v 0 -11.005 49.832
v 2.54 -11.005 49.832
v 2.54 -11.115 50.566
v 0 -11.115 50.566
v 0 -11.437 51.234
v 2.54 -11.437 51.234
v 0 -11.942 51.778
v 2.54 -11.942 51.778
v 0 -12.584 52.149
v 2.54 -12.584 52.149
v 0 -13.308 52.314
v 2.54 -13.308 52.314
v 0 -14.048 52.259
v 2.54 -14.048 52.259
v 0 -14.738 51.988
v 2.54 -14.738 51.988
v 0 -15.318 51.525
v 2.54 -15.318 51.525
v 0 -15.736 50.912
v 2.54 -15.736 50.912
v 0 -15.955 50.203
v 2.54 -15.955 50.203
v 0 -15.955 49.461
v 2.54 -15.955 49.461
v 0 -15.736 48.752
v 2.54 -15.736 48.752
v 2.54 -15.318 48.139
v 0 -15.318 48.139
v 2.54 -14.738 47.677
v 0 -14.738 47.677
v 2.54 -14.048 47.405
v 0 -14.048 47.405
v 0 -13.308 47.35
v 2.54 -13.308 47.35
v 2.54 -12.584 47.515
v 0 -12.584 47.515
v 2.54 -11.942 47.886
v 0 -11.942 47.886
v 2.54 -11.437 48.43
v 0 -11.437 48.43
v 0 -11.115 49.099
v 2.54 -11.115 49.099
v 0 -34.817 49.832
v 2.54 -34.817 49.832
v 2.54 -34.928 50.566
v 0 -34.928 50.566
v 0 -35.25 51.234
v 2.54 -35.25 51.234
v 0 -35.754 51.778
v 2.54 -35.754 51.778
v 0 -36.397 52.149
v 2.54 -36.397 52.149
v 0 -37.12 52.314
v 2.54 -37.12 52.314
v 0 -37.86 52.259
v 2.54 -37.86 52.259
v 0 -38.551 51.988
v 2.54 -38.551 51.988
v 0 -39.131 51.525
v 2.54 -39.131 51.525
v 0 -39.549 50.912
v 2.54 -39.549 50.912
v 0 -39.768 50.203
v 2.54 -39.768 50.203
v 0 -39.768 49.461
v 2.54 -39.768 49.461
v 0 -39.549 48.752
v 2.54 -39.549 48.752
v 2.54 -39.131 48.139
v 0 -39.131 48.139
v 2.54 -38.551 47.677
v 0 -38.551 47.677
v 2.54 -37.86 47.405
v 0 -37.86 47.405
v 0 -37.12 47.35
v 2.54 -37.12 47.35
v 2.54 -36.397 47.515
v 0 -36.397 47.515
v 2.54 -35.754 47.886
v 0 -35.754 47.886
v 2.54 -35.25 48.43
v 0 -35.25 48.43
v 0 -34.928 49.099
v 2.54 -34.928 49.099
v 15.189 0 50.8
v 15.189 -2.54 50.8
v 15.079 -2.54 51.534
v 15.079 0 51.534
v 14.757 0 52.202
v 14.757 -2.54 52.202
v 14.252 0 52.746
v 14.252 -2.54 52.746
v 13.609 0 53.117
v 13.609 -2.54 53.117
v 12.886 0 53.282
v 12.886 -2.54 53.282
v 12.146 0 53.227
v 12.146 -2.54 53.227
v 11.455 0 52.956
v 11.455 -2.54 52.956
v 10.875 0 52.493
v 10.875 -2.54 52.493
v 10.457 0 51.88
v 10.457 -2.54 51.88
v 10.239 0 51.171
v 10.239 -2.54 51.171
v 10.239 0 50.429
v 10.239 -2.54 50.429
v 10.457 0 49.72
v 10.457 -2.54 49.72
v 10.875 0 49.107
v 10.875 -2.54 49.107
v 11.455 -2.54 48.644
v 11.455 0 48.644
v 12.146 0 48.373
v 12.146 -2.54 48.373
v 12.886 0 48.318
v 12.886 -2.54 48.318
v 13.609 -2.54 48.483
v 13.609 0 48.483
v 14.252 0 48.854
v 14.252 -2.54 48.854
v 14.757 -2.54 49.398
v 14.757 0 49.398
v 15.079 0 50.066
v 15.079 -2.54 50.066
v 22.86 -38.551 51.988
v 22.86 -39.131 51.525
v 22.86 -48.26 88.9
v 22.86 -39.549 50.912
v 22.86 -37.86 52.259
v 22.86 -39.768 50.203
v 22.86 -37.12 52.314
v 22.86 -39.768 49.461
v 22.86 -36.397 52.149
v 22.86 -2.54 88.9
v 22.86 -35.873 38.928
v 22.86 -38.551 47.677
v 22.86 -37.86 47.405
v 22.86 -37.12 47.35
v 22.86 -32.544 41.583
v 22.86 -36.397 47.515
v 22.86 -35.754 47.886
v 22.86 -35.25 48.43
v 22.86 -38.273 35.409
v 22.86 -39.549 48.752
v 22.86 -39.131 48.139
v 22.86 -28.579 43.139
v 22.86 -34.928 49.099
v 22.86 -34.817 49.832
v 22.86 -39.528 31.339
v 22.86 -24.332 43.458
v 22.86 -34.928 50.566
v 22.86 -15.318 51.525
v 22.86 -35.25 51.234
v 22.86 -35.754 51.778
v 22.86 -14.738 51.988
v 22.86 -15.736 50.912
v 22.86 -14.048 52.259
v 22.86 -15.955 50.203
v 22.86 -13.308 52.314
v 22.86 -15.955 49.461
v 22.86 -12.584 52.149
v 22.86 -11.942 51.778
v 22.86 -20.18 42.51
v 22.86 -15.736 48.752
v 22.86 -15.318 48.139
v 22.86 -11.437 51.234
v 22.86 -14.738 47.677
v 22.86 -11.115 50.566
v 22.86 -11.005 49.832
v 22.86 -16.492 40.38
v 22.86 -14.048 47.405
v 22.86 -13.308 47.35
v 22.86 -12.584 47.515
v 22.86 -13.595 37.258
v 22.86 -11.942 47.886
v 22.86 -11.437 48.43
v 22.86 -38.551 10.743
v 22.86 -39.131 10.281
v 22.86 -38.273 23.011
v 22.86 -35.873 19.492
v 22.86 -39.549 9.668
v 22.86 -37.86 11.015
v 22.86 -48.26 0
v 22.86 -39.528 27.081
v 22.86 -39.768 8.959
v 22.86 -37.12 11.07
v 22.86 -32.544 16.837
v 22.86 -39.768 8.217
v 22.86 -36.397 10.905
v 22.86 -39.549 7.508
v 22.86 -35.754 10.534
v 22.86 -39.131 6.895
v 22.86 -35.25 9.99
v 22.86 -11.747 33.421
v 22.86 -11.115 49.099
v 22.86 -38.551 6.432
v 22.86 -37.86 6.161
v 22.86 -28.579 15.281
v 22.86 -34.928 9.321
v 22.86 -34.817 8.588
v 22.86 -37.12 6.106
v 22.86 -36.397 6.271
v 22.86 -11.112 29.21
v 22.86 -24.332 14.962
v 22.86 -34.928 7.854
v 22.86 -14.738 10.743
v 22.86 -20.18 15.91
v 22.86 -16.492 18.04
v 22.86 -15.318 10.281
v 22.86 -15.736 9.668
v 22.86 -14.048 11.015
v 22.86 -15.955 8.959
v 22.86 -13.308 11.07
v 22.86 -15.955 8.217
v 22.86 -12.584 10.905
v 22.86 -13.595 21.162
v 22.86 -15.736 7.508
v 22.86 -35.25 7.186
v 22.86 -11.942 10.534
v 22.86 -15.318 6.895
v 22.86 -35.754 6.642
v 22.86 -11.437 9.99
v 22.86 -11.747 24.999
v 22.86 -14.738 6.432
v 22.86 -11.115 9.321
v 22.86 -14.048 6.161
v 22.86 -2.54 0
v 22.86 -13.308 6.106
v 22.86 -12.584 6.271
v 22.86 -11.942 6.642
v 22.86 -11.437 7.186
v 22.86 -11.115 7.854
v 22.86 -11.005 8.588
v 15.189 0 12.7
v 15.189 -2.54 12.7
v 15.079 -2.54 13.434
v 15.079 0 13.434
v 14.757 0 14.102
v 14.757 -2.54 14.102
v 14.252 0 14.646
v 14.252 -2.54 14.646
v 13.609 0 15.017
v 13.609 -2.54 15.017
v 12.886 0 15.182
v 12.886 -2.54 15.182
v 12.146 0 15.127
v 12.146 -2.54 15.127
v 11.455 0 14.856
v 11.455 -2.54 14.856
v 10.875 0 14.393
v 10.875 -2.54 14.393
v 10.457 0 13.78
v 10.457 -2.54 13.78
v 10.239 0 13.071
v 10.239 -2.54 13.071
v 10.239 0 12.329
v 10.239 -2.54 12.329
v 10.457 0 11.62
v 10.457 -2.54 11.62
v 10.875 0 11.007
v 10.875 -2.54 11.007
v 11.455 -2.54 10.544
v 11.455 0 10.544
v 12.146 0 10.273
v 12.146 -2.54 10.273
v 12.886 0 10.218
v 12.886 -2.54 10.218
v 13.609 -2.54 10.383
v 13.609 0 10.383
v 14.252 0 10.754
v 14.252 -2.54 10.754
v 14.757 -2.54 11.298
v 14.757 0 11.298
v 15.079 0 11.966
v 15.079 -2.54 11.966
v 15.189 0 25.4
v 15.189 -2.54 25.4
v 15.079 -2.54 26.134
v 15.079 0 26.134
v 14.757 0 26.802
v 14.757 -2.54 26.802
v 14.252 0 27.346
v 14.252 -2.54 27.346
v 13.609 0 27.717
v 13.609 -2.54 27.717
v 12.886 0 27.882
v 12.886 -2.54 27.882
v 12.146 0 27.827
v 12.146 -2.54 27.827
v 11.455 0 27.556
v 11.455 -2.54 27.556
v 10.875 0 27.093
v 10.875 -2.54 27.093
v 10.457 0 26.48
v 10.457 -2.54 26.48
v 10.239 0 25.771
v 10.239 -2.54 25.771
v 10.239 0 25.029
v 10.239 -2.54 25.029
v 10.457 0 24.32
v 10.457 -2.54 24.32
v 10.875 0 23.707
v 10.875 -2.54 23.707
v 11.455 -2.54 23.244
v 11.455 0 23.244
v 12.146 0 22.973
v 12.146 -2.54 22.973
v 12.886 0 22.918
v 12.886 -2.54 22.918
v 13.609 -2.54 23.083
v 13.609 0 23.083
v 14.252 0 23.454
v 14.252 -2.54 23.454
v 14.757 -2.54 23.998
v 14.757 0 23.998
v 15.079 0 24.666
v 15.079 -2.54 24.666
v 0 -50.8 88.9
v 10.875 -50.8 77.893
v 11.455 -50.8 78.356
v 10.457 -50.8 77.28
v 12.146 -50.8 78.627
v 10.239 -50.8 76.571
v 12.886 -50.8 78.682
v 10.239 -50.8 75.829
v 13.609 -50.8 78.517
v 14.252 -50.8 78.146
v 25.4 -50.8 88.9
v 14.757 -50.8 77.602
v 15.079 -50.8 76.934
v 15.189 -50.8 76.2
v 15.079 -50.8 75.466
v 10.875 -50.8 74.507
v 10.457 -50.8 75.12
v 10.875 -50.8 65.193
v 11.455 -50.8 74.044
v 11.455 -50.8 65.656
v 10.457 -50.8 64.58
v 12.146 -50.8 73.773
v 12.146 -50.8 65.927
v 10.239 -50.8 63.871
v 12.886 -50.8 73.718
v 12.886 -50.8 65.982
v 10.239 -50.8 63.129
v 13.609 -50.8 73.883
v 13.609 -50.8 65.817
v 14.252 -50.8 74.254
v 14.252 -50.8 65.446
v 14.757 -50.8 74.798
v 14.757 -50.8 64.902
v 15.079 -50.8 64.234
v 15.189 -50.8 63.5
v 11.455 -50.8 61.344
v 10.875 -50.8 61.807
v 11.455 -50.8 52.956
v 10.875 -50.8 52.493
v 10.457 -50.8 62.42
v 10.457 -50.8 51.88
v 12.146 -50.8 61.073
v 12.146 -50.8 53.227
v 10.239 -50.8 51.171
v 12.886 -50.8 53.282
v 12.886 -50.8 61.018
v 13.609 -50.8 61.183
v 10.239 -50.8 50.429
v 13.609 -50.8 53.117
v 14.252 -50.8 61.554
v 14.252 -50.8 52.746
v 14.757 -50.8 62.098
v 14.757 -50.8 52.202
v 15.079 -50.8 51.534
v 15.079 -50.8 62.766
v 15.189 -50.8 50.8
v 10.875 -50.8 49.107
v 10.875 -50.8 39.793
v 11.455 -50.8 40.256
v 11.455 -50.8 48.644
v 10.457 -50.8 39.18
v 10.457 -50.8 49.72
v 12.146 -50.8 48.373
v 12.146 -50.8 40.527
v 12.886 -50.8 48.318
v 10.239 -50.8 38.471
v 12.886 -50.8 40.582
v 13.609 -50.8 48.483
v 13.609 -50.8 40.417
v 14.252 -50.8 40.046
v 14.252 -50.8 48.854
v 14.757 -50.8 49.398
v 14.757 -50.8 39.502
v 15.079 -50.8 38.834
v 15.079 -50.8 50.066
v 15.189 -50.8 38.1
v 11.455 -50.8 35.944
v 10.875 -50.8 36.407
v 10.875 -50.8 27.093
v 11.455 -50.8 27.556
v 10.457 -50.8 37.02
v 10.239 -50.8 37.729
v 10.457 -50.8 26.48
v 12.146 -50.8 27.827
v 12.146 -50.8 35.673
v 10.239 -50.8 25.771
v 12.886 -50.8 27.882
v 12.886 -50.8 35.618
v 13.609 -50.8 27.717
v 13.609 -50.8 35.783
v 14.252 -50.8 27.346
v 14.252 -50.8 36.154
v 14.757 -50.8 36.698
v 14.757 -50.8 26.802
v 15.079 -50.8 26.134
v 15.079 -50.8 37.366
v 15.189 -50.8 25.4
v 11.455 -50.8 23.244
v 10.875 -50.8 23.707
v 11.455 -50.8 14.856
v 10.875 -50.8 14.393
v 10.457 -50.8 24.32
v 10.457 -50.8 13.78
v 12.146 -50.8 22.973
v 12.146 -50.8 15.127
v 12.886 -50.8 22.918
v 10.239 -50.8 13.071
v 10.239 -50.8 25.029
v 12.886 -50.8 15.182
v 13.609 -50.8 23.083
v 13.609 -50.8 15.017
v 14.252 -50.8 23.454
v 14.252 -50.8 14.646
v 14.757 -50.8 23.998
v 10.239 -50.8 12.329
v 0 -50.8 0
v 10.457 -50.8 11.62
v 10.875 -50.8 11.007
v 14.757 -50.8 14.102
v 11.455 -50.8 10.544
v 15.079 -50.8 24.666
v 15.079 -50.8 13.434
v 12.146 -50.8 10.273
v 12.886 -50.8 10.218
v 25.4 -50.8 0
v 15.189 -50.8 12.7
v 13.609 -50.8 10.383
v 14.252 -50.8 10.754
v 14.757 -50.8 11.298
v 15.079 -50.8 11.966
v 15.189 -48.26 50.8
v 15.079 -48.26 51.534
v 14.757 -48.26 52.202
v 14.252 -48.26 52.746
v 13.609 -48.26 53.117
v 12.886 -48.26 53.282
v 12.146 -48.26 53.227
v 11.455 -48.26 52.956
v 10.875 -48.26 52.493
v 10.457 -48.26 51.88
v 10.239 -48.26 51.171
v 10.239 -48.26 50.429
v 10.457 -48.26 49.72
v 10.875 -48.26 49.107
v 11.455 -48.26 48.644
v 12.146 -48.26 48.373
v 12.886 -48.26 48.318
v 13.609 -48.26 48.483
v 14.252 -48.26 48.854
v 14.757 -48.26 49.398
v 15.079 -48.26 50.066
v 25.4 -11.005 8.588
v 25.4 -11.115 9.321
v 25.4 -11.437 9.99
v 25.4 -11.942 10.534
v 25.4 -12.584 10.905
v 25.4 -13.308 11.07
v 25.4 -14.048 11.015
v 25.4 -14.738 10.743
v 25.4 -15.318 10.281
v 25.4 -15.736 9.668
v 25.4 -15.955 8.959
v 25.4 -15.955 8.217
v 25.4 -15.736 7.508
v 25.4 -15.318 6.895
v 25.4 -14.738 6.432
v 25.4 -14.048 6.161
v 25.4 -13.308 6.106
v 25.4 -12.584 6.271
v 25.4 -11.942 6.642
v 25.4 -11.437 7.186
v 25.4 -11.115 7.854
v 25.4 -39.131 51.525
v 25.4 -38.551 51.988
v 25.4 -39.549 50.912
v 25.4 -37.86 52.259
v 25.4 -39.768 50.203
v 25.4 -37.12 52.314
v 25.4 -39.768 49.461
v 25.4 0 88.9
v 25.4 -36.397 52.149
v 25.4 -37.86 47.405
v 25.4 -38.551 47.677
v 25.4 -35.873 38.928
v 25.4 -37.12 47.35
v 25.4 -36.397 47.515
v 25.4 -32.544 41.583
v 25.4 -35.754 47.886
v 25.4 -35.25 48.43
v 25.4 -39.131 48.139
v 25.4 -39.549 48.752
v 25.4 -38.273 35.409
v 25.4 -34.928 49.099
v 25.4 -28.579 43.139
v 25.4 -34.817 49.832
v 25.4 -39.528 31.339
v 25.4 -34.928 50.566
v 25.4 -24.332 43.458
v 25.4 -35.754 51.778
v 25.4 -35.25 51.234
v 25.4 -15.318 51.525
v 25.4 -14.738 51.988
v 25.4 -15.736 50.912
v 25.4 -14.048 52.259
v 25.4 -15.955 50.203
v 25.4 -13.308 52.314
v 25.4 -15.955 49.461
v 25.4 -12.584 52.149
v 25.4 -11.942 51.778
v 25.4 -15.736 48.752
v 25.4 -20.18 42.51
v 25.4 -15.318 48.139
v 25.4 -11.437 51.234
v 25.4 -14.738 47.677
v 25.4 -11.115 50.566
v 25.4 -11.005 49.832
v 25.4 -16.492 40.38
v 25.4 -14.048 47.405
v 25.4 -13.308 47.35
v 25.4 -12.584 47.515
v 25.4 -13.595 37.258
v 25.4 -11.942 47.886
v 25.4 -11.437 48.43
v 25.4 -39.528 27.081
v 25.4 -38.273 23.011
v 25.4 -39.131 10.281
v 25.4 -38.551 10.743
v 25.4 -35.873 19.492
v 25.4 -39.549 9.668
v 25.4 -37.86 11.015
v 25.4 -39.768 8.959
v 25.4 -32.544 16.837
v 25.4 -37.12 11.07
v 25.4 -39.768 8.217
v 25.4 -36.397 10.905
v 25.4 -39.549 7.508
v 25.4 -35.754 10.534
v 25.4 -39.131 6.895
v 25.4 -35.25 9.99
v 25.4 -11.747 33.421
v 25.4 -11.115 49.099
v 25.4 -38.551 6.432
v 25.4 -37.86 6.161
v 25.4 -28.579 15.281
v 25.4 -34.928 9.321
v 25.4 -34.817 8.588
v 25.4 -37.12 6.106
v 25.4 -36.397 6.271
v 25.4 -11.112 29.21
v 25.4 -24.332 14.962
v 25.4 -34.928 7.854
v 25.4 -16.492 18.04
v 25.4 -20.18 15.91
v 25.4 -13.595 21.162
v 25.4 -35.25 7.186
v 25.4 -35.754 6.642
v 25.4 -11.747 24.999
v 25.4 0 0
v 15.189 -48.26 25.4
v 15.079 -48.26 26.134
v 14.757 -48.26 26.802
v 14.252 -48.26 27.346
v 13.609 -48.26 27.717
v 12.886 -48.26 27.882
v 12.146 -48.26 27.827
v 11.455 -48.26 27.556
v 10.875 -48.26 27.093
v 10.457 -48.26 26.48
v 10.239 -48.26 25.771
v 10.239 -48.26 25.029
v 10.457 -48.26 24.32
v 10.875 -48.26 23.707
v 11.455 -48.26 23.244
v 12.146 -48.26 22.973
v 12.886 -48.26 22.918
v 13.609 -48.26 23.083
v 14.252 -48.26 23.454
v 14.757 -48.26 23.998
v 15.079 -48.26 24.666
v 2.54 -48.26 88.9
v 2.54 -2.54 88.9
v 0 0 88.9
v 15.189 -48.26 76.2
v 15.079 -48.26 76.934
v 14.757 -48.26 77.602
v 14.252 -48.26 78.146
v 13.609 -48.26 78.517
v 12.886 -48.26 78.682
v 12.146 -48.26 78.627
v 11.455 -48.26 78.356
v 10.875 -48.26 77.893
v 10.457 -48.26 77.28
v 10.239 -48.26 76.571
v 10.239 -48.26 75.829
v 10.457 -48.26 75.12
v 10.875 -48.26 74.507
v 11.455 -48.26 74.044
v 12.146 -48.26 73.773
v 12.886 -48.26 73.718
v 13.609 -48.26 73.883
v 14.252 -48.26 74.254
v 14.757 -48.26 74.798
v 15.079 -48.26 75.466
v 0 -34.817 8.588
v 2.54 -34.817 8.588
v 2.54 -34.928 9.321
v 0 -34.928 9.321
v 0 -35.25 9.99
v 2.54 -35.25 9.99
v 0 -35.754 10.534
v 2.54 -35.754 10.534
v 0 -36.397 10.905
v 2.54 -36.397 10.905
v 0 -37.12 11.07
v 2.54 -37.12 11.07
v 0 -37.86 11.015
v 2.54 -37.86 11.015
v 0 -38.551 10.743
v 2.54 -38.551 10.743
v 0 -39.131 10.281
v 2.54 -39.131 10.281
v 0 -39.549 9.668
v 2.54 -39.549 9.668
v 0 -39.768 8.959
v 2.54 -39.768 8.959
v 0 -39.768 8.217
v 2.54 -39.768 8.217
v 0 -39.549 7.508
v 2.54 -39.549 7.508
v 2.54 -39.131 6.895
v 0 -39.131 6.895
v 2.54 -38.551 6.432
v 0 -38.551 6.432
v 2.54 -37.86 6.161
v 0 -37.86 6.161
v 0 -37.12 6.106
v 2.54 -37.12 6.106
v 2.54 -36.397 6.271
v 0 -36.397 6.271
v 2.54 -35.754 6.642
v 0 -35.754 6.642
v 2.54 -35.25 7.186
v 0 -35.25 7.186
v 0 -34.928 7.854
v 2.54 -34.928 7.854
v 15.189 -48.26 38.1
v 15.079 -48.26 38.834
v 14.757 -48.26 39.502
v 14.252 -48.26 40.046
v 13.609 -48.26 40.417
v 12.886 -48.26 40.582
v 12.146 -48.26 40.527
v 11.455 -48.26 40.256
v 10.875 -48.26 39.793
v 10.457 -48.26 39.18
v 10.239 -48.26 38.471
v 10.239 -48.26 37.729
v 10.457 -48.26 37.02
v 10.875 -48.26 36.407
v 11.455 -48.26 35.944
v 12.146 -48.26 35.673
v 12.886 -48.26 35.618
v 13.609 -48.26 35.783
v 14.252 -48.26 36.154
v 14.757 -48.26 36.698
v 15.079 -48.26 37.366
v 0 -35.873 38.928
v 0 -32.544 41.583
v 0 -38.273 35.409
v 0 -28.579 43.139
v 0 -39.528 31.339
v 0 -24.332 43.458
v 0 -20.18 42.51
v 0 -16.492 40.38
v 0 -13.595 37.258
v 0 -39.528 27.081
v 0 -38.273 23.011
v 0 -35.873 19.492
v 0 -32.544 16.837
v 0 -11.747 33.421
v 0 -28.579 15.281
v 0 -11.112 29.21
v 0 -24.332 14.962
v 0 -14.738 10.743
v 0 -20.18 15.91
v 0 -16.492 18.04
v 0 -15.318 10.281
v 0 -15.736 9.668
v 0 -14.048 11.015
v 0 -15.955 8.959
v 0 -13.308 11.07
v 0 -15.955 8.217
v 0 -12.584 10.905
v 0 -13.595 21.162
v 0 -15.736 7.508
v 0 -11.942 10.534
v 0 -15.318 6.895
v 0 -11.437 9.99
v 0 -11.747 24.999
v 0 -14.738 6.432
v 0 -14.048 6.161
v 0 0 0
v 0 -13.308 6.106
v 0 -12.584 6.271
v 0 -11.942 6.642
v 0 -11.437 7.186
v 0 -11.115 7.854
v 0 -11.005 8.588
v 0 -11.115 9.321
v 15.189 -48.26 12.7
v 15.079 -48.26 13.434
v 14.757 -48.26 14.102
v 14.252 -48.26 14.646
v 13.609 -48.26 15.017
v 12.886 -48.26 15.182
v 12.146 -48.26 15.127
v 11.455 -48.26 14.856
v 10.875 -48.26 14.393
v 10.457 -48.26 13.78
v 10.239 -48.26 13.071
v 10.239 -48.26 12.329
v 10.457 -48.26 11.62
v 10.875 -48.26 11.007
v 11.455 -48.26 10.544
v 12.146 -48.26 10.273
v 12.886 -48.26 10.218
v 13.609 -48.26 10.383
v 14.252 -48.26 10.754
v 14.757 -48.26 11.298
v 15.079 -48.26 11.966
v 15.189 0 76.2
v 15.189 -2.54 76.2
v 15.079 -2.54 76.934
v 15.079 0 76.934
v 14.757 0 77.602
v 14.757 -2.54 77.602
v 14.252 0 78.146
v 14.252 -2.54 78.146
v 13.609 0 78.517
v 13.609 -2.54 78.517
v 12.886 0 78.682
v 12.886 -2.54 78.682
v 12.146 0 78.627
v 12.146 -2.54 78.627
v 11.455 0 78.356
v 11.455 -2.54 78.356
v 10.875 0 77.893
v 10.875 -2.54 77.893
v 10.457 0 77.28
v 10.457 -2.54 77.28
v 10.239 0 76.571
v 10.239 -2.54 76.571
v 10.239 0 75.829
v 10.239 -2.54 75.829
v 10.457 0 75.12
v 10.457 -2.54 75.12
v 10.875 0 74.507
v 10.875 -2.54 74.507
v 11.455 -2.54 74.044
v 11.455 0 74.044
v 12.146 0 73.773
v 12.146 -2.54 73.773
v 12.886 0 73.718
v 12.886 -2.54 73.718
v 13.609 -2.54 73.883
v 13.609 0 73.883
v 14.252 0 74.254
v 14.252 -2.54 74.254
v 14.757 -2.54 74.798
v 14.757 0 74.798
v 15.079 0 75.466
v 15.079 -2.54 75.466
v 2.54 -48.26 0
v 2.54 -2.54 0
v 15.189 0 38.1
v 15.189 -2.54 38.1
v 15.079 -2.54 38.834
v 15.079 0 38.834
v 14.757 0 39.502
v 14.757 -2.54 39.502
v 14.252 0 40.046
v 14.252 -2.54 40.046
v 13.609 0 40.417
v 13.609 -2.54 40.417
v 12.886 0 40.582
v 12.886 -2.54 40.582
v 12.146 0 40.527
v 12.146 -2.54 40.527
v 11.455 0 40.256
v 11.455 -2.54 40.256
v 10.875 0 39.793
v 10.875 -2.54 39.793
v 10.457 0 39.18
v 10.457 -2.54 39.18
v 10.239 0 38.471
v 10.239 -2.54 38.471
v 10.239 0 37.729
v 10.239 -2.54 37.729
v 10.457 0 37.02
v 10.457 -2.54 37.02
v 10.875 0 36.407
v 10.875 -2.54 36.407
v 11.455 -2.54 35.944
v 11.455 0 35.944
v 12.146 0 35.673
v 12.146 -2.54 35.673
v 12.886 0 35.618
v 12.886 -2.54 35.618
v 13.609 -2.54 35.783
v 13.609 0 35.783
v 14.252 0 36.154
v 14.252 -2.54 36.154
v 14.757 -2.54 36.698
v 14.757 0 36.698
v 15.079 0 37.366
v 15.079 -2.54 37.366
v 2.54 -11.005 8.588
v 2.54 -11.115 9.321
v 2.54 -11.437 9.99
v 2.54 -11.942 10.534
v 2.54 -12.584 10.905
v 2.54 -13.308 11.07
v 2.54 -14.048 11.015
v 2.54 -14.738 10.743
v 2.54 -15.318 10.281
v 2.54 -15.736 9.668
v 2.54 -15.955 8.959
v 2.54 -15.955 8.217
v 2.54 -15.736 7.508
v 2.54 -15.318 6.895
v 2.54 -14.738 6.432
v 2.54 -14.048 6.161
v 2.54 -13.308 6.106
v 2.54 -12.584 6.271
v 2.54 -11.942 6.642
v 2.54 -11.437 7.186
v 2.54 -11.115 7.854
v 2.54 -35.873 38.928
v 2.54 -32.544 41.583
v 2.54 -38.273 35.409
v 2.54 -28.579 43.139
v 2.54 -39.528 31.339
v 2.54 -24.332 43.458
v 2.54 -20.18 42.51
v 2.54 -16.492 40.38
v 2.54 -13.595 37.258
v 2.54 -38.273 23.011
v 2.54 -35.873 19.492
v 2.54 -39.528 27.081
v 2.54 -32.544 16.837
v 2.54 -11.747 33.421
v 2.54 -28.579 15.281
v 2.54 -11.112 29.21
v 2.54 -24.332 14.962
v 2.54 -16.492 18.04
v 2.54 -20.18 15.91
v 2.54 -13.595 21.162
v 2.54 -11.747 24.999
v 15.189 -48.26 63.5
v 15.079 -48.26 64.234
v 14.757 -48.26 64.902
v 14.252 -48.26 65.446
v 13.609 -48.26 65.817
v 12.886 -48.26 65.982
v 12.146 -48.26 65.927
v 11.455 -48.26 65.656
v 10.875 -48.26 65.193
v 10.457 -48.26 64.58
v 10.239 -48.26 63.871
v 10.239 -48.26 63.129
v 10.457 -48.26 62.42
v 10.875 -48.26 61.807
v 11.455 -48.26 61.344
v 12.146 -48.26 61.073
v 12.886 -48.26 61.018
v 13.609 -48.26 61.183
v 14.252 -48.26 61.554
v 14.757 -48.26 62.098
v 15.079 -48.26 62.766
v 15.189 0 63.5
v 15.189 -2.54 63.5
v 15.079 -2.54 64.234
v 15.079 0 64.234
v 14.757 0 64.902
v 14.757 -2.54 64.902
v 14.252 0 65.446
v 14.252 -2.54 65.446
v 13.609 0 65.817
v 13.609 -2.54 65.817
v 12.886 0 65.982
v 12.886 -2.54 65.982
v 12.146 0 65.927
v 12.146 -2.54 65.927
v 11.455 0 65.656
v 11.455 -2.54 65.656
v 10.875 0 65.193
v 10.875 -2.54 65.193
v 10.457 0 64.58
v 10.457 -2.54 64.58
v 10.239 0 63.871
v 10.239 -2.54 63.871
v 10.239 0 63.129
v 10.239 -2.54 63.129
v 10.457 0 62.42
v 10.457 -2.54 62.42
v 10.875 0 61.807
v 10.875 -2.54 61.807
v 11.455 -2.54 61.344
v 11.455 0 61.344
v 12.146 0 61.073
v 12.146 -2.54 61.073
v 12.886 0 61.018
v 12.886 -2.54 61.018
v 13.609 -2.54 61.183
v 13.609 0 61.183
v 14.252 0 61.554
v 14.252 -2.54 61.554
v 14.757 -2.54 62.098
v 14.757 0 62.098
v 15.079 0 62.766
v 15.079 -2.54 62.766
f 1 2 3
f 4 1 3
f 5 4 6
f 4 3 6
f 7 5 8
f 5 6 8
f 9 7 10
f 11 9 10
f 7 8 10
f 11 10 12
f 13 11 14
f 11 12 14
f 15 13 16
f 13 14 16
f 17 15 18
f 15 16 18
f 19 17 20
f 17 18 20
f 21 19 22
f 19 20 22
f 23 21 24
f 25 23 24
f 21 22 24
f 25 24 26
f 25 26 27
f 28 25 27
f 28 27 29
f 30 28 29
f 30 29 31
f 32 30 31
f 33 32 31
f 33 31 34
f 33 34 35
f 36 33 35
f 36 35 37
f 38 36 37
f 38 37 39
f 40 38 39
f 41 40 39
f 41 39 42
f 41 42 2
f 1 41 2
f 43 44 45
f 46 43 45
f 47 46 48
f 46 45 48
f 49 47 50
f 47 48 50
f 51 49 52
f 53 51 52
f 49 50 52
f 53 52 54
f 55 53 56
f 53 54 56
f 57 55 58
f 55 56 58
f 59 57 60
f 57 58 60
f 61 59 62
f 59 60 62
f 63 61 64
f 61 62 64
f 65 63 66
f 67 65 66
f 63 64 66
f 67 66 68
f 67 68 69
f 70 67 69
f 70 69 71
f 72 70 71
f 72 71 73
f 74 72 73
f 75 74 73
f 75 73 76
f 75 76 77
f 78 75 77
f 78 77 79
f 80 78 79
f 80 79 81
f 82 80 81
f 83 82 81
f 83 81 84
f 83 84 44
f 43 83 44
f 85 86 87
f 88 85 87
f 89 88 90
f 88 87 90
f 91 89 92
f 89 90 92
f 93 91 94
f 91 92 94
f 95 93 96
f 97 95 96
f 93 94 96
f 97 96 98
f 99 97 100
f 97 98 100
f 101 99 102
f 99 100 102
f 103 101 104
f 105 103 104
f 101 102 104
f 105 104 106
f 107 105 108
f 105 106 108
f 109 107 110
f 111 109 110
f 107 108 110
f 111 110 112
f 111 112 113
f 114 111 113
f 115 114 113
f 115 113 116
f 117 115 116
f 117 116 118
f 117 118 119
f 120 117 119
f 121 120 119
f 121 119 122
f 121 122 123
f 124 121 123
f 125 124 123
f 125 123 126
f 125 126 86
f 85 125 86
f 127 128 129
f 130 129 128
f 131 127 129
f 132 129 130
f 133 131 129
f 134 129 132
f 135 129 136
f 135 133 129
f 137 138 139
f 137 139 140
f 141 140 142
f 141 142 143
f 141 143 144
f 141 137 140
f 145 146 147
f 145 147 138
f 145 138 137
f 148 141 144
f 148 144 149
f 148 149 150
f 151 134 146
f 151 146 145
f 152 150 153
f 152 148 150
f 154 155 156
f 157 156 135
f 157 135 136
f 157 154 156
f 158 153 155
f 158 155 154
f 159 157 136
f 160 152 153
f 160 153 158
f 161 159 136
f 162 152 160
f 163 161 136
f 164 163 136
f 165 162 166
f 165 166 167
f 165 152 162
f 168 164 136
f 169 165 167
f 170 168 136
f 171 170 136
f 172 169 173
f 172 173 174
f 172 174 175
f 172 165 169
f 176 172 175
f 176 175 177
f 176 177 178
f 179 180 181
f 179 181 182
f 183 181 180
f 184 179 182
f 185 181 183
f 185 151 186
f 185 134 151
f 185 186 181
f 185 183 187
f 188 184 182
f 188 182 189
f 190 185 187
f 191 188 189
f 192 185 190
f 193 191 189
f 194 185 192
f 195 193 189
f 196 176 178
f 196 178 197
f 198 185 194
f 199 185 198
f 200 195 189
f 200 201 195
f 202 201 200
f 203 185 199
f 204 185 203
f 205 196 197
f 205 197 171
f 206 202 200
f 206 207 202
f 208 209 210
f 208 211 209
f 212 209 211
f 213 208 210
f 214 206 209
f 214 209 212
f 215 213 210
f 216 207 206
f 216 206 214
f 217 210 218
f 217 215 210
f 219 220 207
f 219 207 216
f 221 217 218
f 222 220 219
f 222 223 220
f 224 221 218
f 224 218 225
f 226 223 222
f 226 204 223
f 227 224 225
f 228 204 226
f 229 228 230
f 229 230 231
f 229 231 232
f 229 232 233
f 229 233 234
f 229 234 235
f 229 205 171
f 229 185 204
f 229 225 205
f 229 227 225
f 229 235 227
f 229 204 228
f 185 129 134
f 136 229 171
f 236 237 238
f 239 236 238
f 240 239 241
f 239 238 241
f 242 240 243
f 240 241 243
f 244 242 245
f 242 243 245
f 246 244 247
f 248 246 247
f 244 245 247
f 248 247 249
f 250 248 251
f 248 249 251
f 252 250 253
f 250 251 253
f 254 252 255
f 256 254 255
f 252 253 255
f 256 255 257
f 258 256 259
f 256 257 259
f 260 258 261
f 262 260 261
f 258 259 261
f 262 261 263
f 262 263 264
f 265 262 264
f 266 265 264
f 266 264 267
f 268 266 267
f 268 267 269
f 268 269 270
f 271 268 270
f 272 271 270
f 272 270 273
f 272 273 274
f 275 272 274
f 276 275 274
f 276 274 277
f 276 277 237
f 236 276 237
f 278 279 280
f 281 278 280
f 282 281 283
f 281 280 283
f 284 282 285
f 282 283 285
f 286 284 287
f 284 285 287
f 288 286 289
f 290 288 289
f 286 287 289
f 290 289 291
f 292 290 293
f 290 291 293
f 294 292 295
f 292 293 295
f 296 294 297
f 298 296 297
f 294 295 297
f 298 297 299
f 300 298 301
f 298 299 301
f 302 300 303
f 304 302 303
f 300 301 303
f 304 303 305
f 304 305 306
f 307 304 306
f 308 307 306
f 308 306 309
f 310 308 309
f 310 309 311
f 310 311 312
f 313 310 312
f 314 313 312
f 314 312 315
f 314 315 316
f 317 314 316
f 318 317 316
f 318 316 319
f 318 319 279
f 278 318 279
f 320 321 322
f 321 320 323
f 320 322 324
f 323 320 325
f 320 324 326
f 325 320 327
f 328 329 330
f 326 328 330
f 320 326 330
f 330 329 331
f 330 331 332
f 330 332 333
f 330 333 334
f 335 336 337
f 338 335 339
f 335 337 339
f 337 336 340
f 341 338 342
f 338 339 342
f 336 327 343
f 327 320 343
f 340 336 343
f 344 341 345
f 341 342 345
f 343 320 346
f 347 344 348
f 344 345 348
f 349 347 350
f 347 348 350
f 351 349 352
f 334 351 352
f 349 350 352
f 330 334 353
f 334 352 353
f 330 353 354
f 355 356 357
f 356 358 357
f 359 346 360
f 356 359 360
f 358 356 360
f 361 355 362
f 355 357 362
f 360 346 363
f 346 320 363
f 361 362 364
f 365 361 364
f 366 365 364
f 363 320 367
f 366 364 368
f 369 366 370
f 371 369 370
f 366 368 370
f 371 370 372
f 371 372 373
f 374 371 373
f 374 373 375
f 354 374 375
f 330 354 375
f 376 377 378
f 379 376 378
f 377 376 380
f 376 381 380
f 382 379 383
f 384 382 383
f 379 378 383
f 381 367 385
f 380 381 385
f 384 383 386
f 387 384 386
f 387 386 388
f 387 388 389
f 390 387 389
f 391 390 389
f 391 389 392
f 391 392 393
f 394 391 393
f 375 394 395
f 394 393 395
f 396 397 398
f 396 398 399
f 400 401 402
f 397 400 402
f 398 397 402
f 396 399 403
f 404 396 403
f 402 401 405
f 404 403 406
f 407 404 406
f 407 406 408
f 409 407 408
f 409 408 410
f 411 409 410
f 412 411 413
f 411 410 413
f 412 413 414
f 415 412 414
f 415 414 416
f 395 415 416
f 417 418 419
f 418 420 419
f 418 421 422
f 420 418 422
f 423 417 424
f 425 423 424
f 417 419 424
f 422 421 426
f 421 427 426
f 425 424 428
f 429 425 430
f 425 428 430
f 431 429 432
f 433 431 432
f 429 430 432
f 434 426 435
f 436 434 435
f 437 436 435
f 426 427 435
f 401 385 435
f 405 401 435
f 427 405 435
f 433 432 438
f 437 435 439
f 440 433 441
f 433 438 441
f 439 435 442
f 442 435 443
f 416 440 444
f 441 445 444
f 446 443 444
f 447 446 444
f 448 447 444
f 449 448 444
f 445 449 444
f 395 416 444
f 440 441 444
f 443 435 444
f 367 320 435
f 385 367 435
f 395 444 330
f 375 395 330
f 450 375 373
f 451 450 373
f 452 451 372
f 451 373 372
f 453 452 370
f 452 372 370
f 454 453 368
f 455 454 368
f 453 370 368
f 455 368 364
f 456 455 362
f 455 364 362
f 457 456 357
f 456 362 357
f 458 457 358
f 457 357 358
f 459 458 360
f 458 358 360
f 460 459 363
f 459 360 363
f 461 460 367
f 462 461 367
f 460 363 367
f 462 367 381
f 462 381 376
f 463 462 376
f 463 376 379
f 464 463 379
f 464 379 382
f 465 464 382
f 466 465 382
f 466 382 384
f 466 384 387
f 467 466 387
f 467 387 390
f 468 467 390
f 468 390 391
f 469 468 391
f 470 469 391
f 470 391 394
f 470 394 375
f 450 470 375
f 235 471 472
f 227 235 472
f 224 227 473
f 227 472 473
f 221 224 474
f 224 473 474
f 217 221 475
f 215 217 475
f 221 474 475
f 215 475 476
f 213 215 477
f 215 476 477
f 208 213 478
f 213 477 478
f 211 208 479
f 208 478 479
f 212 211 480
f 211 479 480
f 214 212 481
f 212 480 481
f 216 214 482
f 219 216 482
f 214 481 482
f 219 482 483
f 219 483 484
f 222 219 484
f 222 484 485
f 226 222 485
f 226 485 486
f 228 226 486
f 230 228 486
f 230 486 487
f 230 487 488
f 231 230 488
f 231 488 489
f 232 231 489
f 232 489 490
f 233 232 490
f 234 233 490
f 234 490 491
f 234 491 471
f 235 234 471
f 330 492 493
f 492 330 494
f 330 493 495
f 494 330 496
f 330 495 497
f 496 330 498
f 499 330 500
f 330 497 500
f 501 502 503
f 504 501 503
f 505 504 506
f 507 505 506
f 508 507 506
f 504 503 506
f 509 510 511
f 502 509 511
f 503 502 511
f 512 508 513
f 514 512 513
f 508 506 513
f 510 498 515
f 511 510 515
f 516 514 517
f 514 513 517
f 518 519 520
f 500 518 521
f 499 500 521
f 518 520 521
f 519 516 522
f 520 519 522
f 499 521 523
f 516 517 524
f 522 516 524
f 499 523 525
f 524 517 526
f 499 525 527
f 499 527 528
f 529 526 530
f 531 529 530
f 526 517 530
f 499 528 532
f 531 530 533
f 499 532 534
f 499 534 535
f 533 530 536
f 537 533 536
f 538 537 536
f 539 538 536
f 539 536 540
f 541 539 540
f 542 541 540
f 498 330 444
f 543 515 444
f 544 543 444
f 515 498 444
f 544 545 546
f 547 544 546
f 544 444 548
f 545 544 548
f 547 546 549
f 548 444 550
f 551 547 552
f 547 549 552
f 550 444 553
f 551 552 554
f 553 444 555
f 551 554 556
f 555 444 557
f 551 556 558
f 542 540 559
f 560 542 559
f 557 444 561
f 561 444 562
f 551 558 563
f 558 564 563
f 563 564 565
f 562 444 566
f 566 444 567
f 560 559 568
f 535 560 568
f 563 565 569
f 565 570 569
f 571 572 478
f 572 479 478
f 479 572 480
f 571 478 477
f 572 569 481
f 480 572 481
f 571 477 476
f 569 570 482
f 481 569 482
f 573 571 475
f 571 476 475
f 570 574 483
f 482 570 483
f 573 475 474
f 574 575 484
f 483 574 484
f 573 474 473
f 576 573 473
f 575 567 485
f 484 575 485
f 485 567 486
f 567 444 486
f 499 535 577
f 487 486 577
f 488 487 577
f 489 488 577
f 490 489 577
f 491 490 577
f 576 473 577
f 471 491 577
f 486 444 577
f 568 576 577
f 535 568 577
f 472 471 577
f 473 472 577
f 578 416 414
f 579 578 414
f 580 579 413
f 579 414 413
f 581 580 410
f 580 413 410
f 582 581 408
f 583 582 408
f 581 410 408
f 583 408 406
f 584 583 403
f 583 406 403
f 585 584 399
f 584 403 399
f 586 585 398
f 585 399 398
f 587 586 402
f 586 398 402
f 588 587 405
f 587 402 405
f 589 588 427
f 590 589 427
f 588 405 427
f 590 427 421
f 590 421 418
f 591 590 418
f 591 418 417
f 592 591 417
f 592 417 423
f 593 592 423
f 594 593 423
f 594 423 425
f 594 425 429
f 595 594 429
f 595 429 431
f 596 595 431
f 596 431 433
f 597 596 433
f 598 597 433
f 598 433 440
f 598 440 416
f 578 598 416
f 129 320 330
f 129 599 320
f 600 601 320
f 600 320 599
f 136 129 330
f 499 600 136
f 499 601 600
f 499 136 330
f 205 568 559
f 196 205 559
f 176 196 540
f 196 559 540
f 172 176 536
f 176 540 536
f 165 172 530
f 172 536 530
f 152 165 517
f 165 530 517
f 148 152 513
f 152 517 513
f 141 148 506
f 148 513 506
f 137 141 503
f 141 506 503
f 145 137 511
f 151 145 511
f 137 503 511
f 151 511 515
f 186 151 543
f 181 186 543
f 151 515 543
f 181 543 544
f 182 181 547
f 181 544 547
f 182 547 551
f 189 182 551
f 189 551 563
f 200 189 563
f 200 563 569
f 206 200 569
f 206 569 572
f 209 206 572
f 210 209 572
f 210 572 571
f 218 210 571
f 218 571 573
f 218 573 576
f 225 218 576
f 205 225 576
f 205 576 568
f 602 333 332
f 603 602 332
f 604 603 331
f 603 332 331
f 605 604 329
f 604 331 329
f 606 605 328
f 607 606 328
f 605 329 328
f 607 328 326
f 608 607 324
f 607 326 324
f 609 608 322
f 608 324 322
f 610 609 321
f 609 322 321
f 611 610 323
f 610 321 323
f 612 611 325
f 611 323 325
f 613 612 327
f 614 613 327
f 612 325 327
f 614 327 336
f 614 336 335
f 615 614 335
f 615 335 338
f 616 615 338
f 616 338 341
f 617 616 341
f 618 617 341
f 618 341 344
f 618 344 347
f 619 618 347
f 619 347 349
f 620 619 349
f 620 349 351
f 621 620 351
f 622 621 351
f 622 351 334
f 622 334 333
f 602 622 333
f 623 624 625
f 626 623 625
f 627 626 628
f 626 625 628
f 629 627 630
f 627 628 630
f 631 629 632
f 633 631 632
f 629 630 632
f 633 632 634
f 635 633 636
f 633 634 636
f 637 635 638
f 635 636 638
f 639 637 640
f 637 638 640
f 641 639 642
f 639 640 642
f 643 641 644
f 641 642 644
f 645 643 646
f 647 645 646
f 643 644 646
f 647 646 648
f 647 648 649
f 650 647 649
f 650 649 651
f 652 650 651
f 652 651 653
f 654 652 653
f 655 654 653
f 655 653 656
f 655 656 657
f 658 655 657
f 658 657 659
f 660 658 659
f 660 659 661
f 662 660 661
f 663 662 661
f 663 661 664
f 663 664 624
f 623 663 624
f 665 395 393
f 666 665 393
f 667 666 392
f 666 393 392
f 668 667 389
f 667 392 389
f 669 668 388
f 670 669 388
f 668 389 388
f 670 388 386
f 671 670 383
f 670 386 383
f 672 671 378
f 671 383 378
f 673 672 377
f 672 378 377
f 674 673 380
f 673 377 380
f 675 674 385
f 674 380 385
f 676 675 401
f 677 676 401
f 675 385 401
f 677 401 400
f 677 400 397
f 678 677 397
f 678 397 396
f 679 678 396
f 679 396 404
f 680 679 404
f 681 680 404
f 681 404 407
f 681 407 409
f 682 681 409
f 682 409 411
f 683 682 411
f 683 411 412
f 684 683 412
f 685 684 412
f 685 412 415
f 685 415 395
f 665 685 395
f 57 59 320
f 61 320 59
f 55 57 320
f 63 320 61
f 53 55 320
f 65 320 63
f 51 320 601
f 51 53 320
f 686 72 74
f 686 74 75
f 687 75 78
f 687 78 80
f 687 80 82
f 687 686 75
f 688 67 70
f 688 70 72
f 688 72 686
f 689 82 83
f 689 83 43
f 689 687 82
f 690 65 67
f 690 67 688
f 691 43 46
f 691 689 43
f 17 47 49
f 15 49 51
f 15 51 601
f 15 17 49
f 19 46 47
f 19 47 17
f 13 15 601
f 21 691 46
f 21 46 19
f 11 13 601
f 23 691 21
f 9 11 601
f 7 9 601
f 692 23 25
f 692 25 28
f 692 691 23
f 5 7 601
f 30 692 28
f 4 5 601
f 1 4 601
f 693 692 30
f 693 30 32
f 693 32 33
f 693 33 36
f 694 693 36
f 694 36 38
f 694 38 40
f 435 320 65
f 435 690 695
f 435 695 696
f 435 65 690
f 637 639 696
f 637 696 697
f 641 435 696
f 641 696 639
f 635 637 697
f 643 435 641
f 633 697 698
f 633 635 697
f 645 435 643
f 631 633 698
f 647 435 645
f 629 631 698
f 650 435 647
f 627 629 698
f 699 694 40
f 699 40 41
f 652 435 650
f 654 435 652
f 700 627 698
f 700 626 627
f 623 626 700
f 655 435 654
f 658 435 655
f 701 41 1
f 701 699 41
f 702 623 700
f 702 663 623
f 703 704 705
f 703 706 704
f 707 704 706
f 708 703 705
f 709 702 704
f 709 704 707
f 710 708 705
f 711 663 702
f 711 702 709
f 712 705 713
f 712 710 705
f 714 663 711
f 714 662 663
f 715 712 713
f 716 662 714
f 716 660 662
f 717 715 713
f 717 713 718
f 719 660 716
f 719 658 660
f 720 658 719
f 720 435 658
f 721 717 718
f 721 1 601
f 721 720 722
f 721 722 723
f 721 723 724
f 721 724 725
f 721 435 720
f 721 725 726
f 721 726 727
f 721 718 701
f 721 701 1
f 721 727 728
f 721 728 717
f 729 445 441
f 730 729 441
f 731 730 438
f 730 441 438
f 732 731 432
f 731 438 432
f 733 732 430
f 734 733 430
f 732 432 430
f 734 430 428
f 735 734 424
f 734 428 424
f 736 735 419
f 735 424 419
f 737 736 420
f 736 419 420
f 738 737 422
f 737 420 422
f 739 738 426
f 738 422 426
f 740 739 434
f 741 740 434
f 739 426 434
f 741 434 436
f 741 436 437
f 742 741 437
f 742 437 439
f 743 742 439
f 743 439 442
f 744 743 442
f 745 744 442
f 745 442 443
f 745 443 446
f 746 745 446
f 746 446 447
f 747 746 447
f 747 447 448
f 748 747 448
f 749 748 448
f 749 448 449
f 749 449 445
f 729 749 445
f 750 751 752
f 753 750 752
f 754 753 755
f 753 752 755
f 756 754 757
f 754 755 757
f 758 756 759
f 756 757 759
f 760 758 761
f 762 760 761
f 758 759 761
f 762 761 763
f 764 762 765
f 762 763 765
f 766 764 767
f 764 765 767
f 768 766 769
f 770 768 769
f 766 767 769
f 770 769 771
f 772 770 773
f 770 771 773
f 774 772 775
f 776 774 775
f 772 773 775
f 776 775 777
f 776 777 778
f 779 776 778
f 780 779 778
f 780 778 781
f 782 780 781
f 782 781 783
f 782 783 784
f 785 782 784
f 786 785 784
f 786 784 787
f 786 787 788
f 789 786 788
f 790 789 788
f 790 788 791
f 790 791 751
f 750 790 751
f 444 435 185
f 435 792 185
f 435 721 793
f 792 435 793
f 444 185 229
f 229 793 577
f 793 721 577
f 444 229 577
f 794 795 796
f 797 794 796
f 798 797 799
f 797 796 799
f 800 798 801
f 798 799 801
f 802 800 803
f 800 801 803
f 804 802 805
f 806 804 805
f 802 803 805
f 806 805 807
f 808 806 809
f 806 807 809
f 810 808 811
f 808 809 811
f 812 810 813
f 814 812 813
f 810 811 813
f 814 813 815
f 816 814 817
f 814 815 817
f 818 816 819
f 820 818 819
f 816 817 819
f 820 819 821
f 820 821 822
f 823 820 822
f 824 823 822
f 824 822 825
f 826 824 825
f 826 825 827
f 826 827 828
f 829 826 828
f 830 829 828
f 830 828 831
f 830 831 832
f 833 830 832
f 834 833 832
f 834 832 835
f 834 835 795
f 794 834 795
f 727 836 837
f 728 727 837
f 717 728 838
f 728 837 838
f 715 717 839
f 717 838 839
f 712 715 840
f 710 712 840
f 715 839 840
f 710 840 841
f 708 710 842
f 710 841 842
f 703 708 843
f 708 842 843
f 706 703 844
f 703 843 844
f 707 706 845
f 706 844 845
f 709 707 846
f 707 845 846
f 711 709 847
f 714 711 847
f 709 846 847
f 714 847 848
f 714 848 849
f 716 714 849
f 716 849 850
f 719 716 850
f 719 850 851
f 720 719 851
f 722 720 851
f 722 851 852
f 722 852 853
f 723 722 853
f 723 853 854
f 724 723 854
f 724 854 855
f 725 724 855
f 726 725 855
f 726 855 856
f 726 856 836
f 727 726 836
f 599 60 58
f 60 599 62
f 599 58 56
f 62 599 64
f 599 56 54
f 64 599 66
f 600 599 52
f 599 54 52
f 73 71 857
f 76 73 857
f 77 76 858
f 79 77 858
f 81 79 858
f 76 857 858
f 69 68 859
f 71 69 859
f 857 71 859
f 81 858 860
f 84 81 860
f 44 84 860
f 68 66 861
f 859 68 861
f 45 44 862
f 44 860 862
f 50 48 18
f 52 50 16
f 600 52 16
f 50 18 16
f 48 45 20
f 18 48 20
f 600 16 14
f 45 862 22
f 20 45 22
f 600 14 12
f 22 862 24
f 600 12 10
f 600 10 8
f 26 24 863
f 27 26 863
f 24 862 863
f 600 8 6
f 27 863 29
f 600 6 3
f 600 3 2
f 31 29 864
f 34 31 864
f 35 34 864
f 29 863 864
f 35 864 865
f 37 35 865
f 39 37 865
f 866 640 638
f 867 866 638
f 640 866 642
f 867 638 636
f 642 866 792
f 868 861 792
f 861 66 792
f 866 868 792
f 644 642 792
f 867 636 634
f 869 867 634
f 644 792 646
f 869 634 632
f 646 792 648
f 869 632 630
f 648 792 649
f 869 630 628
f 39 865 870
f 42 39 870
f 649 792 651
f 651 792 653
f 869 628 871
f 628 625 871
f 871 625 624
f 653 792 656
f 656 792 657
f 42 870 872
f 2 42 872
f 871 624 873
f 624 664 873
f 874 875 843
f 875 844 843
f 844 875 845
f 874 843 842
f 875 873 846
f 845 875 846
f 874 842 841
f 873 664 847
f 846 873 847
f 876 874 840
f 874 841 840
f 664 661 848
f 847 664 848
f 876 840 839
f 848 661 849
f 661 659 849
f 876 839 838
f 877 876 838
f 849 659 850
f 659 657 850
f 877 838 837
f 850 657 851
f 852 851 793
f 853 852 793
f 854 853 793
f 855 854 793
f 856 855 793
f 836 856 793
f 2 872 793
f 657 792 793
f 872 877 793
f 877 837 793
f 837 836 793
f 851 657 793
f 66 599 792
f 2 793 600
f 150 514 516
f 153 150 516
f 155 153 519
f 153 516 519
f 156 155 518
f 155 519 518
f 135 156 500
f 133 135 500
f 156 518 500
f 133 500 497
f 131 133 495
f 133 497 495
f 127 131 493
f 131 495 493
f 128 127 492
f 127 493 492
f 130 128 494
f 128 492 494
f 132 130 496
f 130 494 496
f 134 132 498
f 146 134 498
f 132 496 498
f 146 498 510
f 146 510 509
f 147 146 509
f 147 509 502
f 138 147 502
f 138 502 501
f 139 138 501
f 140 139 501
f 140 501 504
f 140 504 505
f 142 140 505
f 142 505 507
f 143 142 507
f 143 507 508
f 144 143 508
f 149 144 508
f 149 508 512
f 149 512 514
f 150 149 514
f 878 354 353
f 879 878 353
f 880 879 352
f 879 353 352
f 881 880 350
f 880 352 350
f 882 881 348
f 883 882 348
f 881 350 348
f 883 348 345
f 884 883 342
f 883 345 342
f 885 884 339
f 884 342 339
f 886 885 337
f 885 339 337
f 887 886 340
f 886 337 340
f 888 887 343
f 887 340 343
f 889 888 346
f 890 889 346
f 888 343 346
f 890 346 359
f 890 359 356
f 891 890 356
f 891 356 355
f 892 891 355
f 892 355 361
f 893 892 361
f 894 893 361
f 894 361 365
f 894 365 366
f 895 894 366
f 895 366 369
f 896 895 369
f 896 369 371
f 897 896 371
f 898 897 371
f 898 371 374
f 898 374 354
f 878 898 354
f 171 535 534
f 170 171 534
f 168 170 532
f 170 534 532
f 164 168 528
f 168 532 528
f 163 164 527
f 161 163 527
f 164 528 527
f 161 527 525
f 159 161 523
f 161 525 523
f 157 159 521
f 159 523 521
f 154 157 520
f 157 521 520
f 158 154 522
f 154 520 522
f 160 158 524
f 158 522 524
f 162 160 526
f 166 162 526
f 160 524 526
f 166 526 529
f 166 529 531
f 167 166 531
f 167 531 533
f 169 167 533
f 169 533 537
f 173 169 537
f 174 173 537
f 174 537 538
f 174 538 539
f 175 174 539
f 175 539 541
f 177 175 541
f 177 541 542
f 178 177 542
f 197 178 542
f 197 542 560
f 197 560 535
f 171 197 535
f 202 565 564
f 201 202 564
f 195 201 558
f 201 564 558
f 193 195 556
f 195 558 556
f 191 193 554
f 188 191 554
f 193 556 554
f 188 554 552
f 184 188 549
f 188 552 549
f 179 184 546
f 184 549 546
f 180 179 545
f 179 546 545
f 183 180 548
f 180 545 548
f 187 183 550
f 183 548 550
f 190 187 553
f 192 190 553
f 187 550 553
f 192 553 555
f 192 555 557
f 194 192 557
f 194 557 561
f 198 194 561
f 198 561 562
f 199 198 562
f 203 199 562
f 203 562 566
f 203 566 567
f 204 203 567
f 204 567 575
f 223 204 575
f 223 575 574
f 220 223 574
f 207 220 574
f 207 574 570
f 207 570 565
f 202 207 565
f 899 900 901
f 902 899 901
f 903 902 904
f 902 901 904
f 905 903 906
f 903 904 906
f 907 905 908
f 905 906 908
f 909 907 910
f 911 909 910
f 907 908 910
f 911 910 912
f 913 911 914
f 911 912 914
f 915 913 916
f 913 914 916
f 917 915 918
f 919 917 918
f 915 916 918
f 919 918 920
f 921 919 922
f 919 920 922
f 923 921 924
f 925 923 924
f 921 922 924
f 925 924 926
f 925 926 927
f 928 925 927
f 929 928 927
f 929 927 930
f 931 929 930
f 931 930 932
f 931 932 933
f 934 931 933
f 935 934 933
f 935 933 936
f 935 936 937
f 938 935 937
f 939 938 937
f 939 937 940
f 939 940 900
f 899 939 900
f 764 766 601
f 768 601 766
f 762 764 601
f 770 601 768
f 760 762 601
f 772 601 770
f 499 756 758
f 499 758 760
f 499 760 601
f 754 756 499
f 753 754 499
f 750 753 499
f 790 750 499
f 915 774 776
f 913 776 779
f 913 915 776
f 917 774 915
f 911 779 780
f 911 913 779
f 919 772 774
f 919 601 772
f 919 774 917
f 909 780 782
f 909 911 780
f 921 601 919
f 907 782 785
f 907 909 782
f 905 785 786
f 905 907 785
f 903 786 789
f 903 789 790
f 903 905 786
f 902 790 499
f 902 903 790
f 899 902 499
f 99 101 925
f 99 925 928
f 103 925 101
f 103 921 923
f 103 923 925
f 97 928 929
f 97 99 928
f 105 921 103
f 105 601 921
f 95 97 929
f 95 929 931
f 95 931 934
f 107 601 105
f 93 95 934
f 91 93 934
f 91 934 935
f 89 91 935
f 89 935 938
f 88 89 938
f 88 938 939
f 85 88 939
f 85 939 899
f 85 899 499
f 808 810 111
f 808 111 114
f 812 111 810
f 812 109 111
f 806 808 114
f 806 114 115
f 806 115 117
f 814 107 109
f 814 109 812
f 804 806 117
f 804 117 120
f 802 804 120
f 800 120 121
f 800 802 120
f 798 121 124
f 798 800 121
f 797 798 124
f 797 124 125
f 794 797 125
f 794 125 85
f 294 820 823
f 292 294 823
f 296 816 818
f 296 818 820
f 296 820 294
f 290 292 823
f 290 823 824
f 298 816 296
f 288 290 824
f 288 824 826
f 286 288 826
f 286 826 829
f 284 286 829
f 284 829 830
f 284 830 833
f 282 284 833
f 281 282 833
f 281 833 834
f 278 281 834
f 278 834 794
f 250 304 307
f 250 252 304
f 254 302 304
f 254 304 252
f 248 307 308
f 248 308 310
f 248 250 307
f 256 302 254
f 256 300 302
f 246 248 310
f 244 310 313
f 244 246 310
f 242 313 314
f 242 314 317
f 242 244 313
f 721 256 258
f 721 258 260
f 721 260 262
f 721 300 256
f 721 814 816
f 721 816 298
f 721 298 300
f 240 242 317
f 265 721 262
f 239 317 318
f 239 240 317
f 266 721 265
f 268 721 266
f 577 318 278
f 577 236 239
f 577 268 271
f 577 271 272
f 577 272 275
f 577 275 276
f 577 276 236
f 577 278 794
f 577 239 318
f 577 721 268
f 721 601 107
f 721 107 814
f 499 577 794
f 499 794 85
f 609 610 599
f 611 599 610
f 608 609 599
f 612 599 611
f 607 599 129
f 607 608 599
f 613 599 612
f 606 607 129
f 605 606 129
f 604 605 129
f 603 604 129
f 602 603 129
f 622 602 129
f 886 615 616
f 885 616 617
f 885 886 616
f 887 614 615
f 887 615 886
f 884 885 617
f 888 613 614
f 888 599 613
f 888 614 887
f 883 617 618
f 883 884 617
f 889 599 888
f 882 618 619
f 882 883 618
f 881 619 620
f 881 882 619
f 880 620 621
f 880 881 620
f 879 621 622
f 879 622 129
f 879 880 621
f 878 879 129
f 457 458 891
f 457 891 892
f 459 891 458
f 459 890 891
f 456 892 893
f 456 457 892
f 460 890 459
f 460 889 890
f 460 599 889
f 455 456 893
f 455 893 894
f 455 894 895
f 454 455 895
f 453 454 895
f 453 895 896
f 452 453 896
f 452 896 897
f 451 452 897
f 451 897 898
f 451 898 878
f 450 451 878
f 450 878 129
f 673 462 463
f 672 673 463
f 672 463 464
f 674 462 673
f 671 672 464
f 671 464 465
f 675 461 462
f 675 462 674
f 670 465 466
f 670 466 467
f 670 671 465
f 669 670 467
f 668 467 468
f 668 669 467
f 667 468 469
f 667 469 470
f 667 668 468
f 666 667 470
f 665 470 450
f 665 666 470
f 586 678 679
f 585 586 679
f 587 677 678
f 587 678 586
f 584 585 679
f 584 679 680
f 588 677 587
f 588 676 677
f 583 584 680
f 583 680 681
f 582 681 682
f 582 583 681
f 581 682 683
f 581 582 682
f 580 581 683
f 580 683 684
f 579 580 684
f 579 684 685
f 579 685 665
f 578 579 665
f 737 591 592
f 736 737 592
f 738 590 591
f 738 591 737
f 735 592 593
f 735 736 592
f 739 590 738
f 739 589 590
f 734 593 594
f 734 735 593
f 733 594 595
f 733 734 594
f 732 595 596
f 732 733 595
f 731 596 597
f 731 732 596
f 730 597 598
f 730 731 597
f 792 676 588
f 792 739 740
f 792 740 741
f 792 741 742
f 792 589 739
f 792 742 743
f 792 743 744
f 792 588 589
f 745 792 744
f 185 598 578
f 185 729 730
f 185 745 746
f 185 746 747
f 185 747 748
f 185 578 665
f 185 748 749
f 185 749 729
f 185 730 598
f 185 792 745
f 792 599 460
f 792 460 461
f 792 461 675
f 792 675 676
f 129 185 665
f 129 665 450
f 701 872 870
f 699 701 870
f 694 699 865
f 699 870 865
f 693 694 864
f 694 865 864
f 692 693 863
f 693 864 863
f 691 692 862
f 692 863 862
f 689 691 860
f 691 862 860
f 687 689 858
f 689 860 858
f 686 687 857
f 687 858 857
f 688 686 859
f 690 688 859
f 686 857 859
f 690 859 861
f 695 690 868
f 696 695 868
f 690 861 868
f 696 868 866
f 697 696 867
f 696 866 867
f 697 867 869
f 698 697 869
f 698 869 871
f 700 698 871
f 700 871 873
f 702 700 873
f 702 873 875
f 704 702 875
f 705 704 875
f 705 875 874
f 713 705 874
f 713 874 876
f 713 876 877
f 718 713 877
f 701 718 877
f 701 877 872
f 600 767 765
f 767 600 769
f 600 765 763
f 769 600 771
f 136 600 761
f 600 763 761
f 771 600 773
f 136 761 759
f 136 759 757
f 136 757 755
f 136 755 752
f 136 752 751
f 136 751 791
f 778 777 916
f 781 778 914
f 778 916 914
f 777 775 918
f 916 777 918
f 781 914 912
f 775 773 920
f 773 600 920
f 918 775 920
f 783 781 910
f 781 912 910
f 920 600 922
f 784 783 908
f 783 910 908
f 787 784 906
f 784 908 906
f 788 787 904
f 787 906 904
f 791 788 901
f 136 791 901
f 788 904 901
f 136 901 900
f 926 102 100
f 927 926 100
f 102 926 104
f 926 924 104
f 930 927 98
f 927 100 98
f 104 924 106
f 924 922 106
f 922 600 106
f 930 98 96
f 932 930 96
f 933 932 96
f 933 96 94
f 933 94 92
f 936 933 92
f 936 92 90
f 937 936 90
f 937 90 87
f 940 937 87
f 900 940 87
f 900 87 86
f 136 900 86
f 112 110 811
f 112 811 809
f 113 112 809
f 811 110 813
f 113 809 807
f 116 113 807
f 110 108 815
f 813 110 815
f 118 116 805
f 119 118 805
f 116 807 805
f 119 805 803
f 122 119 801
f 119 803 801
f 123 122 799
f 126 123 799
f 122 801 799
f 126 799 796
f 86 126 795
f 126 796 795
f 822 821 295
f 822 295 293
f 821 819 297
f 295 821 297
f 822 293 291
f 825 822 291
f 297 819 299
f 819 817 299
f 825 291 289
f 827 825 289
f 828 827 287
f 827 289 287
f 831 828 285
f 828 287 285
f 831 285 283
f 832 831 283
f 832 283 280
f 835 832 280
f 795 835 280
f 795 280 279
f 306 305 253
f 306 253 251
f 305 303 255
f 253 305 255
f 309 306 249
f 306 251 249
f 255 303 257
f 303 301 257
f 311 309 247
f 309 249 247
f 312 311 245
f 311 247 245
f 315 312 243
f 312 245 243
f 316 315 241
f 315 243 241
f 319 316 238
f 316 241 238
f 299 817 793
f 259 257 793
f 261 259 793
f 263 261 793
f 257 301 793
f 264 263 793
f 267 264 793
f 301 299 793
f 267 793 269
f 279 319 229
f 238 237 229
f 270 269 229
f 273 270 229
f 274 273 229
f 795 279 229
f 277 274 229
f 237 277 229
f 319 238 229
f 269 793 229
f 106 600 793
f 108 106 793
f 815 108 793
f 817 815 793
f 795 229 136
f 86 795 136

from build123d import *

# Parameters (mm, degrees)
F0_W     = 25.4
F0_H     = 50.8
F0_W_2   = 20.32
F0_H_2   = 45.72
F1_DEPTH = 88.9
F2_R     = 14.2875
F3_DEPTH = 50.8
F4_R     = 2.4892
F5_DEPTH = 25.401
F6_R     = 2.4892
F7_DEPTH = 50.801


# Not quite as in the source:
# - a feature names something its author has since deleted; it is built from what else it names


with BuildPart() as f1:
    # F0 (on Top) → F1 (new body)
    with BuildSketch(Plane.XY):
        with Locations((12.7, -25.4)):
            Rectangle(F0_W, F0_H)
        with Locations((12.7, -25.4)):
            Rectangle(F0_W_2, F0_H_2, mode=Mode.SUBTRACT)
    extrude(amount=F1_DEPTH)

    # F2 (on face) → F3 (cut)
    with BuildSketch(Plane.YZ.offset(25.4)):
        with Locations((-25.4, 29.21)):
            Circle(F2_R)
    extrude(amount=-F3_DEPTH, mode=Mode.SUBTRACT)

    # F4 (on face) → F5 (cut, through all)
    with BuildSketch(Plane.YZ.offset(25.4)):
        with Locations((-13.49375, 49.8322299276)):
            Circle(F4_R)
        with Locations((-13.49375, 8.5877700724)):
            Circle(F4_R)
        with Locations((-37.30625, 8.5877700724)):
            Circle(F4_R)
        with Locations((-37.30625, 49.8322299276)):
            Circle(F4_R)
    extrude(amount=-F5_DEPTH, mode=Mode.SUBTRACT)

    # F6 (on face) → F7 (cut, through all)
    with BuildSketch(Plane.XZ.offset(50.8)):
        with Locations((12.7, 12.7)):
            Circle(F6_R)
        with Locations((12.7, 25.4)):
            Circle(F6_R)
        with Locations((12.7, 38.1)):
            Circle(F6_R)
        with Locations((12.7, 50.8)):
            Circle(F6_R)
        with Locations((12.7, 63.5)):
            Circle(F6_R)
        with Locations((12.7, 76.2)):
            Circle(F6_R)
    extrude(amount=-F7_DEPTH, mode=Mode.SUBTRACT)


solid = f1.part
